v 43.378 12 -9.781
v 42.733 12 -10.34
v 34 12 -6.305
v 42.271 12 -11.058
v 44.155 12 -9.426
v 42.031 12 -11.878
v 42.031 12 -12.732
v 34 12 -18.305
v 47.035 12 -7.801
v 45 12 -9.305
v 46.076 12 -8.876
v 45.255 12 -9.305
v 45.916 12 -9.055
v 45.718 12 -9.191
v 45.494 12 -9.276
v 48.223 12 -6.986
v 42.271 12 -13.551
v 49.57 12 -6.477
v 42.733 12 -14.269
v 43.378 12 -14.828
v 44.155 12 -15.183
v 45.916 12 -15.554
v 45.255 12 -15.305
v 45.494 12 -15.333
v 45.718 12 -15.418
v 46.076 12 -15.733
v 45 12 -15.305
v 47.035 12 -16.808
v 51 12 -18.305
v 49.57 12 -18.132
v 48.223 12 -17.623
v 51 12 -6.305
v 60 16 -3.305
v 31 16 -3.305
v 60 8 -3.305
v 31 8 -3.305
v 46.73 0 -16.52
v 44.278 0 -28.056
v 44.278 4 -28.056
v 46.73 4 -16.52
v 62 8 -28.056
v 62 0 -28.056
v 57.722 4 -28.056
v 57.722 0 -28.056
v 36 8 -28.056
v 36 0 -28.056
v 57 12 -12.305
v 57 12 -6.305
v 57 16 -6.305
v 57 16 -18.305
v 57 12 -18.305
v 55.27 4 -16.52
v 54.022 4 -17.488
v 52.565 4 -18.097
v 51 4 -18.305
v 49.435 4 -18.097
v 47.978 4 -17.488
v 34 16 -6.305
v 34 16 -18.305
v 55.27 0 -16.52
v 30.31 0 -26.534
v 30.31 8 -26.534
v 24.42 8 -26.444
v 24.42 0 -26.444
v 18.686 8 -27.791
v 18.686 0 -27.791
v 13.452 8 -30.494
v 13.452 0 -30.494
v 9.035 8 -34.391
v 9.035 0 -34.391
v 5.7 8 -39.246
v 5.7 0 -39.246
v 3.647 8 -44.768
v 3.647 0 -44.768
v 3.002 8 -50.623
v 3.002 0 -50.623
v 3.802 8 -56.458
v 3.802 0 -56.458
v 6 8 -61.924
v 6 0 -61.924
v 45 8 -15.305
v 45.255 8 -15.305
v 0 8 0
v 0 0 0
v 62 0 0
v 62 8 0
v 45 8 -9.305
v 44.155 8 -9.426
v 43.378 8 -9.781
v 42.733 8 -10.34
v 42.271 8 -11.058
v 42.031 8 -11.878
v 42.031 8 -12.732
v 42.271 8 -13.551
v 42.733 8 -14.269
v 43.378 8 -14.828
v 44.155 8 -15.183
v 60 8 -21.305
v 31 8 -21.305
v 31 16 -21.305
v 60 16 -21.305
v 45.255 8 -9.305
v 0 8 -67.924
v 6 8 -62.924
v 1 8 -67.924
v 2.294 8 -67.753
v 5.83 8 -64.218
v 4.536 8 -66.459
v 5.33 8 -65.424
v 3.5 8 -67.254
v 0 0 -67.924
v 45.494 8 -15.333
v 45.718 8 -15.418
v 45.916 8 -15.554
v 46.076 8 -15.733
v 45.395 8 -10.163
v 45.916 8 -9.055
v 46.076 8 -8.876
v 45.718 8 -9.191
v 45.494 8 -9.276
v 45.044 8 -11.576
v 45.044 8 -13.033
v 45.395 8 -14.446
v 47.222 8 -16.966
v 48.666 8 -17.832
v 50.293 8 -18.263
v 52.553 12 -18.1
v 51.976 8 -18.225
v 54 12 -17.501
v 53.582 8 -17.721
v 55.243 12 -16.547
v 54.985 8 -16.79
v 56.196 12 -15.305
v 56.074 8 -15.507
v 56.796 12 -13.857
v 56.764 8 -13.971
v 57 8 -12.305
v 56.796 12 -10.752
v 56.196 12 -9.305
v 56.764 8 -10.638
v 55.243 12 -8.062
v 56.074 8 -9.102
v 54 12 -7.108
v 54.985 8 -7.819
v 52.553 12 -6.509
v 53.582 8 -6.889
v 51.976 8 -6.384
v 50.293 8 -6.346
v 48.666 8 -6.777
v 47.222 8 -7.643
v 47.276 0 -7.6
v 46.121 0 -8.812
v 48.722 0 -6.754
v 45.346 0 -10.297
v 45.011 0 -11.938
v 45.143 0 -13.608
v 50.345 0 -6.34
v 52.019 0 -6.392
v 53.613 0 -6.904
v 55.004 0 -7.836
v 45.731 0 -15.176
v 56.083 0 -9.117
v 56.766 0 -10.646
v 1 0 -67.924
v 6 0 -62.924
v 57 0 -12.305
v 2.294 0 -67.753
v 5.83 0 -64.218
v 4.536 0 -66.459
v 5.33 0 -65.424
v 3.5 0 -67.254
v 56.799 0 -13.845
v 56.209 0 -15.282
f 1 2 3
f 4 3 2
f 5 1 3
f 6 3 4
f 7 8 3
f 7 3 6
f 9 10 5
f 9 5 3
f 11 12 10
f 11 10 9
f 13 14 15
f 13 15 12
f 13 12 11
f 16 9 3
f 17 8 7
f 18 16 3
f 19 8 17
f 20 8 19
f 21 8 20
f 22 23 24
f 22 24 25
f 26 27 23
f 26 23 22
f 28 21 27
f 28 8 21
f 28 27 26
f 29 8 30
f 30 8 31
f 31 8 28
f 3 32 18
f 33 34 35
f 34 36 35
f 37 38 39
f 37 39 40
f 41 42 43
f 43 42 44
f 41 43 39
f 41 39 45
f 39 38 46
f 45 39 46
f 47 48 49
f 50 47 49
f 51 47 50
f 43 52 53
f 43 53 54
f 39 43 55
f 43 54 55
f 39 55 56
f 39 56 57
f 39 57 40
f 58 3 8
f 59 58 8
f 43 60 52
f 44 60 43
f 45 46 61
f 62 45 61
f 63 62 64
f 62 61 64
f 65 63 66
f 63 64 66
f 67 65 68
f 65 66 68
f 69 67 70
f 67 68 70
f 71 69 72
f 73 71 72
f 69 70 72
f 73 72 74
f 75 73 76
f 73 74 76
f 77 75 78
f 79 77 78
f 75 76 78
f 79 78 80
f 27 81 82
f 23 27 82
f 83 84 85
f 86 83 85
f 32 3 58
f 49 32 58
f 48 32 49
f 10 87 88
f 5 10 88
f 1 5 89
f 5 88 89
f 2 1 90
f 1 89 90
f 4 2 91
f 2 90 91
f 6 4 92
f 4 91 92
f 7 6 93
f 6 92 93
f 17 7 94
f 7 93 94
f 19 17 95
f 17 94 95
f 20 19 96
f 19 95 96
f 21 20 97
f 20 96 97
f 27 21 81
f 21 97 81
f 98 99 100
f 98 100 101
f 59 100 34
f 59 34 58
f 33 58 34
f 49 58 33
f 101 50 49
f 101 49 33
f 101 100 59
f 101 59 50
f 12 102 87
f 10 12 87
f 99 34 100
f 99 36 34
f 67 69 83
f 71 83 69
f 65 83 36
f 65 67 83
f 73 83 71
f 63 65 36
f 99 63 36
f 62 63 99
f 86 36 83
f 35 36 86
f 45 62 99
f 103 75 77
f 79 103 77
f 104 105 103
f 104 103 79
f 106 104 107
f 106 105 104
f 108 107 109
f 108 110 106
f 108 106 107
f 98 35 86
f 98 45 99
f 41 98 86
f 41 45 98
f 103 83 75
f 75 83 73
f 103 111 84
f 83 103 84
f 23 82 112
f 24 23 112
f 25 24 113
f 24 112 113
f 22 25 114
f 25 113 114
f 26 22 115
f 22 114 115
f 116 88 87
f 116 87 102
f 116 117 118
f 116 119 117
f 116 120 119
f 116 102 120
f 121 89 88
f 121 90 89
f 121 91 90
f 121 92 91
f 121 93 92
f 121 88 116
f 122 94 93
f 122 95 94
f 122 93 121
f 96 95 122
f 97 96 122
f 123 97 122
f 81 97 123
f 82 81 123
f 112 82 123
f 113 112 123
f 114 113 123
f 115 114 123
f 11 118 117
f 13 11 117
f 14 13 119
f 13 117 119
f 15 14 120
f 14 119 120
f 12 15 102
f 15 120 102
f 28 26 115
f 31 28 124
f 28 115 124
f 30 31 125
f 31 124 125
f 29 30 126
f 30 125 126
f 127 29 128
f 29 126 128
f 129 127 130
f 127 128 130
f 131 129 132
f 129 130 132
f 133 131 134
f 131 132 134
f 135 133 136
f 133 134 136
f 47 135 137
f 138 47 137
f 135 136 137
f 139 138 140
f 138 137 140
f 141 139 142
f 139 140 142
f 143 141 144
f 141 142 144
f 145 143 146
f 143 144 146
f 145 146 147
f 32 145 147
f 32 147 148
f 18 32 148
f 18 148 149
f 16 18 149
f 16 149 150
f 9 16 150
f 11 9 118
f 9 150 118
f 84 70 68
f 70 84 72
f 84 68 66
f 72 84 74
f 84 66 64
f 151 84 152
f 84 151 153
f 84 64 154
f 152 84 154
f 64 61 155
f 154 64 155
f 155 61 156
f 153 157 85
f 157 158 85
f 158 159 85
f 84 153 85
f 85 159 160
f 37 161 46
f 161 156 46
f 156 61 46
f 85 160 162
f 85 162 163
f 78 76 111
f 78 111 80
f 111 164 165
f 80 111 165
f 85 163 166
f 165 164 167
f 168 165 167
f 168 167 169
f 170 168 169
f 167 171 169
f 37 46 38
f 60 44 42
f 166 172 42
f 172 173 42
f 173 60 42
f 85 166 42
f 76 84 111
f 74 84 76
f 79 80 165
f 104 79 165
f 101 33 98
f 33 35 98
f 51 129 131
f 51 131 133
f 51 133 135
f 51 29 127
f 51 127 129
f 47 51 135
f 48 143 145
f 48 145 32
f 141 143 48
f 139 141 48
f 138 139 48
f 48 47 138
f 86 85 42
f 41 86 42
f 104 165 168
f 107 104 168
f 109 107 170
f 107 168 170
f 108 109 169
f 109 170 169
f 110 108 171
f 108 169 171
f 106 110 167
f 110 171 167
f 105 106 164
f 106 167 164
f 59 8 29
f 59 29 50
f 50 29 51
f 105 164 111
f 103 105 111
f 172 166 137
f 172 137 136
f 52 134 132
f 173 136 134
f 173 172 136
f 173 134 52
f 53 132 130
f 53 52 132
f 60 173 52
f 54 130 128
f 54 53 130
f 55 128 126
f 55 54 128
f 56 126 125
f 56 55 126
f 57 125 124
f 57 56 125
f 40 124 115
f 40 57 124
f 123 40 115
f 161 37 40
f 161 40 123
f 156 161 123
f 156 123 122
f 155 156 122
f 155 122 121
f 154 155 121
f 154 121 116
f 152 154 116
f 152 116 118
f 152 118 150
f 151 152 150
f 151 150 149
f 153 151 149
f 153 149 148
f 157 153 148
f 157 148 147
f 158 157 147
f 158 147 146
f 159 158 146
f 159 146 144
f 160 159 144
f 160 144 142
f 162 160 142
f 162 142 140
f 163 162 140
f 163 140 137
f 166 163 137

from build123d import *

# Parameters (mm, degrees)
ESQUISSE1_R             = 6
BOSS_EXTRU_1_DEPTH      = 8
ESQUISSE2_W             = 29
ESQUISSE2_H             = 18
BOSS_EXTRU_2_DEPTH      = 4
ESQUISSE3_W             = 29
ESQUISSE3_H             = 18
ESQUISSE3_W_2           = 23
ESQUISSE3_H_2           = 12
BOSS_EXTRU_3_DEPTH      = 4
ENL_V_MAT_EXTRU_1_DEPTH = 4


with BuildPart() as part:
    # Esquisse1 → Boss.-Extru.1 (new body)
    with BuildSketch(Plane(origin=(0, 0, 0), x_dir=(1, 0, 0), z_dir=(0, 1, 0))):
        with BuildLine():
            Line((0, 0), (6, 0))
            Line((6, 0), (36, 0))
            Line((36, 0), (62, 0))
            Line((62, 0), (62, 28.055987731))
            Line((62, 28.055987731), (36, 28.055987731))
            ThreePointArc((36, 28.055987731), (9.034681758, 34.39083629), (6, 61.923533231))
            Line((6, 61.923533231), (6, 62.923533231))
            ThreePointArc((6, 62.923533231), (4.535533906, 66.459067137), (1, 67.923533231))
            Line((1, 67.923533231), (0, 67.923533231))
            Line((0, 67.923533231), (0, 0))
        make_face()
        with Locations((51, 12.304583192)):
            Circle(ESQUISSE1_R, mode=Mode.SUBTRACT)
    extrude(amount=BOSS_EXTRU_1_DEPTH)

    # Esquisse2 → Boss.-Extru.2 (add)
    with BuildSketch(Plane(origin=(0, 8, 0), x_dir=(1, 0, 0), z_dir=(0, 1, 0))):
        with Locations((45.5, 12.304583192)):
            Rectangle(ESQUISSE2_W, ESQUISSE2_H)
        with BuildLine():
            Line((45, 15.304583192), (45.255437353, 15.304583192))
            ThreePointArc((45.255437353, 15.304583192), (45.718347403, 15.418177932), (46.07608916, 15.733154621))
            ThreePointArc((46.07608916, 15.733154621), (57, 12.304583192), (46.07608916, 8.876011764))
            ThreePointArc((46.07608916, 8.876011764), (45.718347403, 9.190988453), (45.255437353, 9.304583192))
            Line((45.255437353, 9.304583192), (45, 9.304583192))
            ThreePointArc((45, 9.304583192), (42, 12.304583192), (45, 15.304583192))
        make_face(mode=Mode.SUBTRACT)
    extrude(amount=BOSS_EXTRU_2_DEPTH)

    # Esquisse3 → Boss.-Extru.3 (add)
    with BuildSketch(Plane(origin=(0, 12, 0), x_dir=(1, 0, 0), z_dir=(0, 1, 0))):
        with Locations((45.5, 12.304583192)):
            Rectangle(ESQUISSE3_W, ESQUISSE3_H)
        with Locations((45.5, 12.304583192)):
            Rectangle(ESQUISSE3_W_2, ESQUISSE3_H_2, mode=Mode.SUBTRACT)
    extrude(amount=BOSS_EXTRU_3_DEPTH)

    # Esquisse4 → Enlèv. mat.-Extru.1 (cut)
    with BuildSketch(Plane.XZ):
        Polygon((47.7, -17.055987731), (54.3, -17.055987731), (55.193703609, -16.162284122), (57.721788353, -28.055987731), (54.3, -28.055987731), (47.7, -28.055987731), (44.278211647, -28.055987731), (46.806296391, -16.162284122), align=None)
    extrude(amount=-ENL_V_MAT_EXTRU_1_DEPTH, mode=Mode.SUBTRACT)


solid = part.part
